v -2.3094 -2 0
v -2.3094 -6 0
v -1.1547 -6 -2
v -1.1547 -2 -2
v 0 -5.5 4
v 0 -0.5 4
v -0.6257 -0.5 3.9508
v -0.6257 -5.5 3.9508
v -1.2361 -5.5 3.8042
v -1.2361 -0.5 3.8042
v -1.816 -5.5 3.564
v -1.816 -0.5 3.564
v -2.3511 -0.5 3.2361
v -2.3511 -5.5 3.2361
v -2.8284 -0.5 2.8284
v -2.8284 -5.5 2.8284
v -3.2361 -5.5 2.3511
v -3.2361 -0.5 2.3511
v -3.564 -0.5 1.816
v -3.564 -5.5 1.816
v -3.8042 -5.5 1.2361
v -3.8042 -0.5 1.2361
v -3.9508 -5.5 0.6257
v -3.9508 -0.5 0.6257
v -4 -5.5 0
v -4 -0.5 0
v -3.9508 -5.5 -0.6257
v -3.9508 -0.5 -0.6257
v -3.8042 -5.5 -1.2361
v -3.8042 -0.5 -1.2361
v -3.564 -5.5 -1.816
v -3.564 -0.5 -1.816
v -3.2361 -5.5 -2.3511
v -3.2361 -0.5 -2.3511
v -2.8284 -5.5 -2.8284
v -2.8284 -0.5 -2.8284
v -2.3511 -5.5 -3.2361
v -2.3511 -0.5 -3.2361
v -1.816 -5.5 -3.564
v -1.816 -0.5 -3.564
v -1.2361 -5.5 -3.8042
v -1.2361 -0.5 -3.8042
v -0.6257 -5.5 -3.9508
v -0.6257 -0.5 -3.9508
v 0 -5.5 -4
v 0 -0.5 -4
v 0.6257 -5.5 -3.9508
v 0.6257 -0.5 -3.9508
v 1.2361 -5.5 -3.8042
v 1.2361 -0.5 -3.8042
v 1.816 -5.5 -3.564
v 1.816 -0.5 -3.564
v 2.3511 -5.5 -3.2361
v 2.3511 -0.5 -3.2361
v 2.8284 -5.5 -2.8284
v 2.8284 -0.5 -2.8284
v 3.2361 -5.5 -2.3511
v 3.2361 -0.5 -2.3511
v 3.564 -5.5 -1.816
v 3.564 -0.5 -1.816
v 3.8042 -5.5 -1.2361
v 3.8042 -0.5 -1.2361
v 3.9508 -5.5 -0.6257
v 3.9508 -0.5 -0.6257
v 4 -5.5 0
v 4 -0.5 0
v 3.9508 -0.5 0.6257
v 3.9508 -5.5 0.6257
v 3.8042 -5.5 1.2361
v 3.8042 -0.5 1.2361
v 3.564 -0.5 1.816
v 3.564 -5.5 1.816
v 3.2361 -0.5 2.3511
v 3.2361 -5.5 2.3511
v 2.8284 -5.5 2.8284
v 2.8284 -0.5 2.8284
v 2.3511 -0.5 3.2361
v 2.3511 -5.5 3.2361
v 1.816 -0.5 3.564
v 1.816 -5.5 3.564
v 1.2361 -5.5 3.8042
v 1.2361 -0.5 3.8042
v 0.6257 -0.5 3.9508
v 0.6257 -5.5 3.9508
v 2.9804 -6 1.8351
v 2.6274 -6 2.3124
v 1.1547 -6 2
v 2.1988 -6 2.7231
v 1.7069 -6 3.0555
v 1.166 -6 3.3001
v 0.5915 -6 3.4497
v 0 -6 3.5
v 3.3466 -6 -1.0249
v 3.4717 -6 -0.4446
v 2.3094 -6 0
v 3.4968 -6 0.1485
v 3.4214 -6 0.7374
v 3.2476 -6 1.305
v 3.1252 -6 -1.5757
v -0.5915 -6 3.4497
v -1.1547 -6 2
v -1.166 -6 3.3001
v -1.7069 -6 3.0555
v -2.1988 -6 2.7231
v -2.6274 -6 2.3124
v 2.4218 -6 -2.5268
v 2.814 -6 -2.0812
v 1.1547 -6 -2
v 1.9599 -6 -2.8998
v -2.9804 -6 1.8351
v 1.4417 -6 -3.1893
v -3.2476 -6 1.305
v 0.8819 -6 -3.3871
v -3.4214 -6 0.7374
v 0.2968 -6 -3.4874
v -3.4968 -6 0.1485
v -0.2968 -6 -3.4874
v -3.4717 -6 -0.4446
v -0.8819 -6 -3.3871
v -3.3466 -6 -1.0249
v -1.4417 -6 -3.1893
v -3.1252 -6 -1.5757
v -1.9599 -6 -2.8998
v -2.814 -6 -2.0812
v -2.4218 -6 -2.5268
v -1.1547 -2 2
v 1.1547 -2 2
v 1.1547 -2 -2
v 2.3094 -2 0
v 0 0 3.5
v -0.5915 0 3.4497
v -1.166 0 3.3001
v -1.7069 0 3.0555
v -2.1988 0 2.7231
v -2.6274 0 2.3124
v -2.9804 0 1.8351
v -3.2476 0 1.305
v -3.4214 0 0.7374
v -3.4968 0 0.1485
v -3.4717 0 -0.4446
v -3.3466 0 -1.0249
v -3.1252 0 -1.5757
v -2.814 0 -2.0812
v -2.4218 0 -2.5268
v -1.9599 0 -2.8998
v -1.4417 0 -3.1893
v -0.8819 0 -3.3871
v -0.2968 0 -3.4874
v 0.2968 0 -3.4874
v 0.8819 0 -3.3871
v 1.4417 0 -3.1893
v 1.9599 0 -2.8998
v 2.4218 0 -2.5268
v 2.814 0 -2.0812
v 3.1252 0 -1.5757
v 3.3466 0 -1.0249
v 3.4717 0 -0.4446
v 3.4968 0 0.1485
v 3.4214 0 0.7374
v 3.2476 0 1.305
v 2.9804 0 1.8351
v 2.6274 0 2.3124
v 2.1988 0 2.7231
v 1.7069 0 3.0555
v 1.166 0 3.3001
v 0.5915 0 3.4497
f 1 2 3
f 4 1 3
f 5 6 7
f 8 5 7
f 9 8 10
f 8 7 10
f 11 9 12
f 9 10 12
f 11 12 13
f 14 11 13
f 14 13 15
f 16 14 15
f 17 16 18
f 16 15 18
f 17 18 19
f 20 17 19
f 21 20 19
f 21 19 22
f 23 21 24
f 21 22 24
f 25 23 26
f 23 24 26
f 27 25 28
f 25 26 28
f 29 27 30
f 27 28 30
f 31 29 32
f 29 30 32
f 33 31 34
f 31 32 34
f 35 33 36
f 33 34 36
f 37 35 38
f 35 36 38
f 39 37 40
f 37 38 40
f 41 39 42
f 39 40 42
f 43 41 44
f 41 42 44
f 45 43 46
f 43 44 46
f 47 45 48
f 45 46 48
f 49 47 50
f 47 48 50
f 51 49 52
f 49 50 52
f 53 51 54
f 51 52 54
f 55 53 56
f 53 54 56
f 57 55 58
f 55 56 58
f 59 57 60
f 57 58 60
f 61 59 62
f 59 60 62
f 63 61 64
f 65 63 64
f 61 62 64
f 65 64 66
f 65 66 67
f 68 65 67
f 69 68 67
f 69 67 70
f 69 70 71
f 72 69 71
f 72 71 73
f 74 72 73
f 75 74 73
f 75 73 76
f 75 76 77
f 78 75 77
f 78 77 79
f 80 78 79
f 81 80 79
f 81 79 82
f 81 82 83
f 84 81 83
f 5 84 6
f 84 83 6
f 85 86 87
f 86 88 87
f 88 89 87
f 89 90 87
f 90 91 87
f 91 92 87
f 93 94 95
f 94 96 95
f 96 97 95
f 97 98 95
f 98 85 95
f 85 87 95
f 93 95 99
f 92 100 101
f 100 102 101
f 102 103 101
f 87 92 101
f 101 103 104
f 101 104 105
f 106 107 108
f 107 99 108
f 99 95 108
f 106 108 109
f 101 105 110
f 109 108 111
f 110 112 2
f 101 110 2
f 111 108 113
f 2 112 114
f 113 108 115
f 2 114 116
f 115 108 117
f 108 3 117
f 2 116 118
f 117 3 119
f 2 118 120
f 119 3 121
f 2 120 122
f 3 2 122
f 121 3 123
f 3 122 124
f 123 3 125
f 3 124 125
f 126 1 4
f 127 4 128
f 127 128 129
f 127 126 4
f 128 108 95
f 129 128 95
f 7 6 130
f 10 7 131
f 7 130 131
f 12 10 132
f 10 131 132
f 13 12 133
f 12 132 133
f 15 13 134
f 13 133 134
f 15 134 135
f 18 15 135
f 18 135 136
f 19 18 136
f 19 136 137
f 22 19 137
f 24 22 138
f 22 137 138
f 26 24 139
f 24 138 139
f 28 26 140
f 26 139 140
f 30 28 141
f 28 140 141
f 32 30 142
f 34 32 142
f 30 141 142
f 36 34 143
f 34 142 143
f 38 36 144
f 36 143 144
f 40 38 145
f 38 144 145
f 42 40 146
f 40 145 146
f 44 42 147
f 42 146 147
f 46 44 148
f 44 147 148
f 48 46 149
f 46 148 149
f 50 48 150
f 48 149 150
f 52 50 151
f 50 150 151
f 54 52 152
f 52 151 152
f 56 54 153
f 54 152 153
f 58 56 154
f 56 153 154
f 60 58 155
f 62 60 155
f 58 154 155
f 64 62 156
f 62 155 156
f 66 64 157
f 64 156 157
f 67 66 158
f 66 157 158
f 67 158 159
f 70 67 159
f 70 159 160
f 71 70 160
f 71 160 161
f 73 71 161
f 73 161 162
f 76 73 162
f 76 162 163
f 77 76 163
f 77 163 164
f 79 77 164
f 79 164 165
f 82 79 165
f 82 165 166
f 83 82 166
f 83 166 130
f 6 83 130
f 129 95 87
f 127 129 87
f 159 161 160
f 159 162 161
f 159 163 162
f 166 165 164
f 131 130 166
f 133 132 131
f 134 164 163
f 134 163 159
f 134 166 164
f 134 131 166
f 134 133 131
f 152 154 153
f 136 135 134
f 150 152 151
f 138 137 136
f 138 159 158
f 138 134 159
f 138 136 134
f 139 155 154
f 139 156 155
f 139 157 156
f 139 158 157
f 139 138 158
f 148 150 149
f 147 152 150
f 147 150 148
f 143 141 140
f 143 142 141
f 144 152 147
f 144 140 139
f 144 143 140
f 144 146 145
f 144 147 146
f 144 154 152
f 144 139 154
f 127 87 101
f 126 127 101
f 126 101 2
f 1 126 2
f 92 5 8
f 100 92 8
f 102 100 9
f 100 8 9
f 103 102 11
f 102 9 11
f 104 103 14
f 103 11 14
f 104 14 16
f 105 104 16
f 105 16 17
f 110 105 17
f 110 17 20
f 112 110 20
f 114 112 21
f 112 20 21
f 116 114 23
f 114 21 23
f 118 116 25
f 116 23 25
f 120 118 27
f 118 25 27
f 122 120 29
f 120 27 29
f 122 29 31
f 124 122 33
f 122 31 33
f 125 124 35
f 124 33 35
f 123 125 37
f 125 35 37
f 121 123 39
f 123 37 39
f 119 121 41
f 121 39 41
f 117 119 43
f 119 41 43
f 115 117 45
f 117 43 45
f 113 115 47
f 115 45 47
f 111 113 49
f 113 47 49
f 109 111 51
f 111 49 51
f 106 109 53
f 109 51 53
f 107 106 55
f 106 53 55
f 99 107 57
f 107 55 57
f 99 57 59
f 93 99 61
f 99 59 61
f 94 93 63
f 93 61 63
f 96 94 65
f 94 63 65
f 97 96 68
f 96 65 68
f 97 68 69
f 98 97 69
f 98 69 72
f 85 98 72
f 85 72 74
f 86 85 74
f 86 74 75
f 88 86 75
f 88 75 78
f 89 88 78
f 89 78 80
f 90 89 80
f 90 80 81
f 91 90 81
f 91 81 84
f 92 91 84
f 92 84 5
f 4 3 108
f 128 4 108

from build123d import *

# Parameters (mm, degrees)
CROQUIS1_W            = 4
CROQUIS1_H            = 6
CHAFL_N1_SIZE         = 0.5
CORTAR_EXTRUIR1_DEPTH = 4


with BuildPart() as part:
    # Croquis1 → Revolución1 (revolve)
    with BuildSketch(Plane.XY, mode=Mode.PRIVATE) as revoluci_n1_sk:
        with Locations((2, -3)):
            Rectangle(CROQUIS1_W, CROQUIS1_H)
    revolve(revoluci_n1_sk.sketch.rotate(Axis((0, 0, 0), (0, -1, 0)), 90), axis=Axis((0, 0, 0), (0, -1, 0)))

    # Chaflán1
    chafl_n1_edges = [part.edges().sort_by_distance(p)[0] for p in [
        (0, -6, -4),
        (0, 0, -4),
    ]]
    chamfer(chafl_n1_edges, length=CHAFL_N1_SIZE)

    # Croquis2 → Cortar-Extruir1 (cut)
    with BuildSketch(Plane.XZ.offset(6)):
        Polygon((-1.154700538, -2), (1.154700538, -2), (2.309401077, 0), (1.154700538, 2), (-1.154700538, 2), (-2.309401077, 0), align=None)
    extrude(amount=-CORTAR_EXTRUIR1_DEPTH, mode=Mode.SUBTRACT)


solid = part.part
